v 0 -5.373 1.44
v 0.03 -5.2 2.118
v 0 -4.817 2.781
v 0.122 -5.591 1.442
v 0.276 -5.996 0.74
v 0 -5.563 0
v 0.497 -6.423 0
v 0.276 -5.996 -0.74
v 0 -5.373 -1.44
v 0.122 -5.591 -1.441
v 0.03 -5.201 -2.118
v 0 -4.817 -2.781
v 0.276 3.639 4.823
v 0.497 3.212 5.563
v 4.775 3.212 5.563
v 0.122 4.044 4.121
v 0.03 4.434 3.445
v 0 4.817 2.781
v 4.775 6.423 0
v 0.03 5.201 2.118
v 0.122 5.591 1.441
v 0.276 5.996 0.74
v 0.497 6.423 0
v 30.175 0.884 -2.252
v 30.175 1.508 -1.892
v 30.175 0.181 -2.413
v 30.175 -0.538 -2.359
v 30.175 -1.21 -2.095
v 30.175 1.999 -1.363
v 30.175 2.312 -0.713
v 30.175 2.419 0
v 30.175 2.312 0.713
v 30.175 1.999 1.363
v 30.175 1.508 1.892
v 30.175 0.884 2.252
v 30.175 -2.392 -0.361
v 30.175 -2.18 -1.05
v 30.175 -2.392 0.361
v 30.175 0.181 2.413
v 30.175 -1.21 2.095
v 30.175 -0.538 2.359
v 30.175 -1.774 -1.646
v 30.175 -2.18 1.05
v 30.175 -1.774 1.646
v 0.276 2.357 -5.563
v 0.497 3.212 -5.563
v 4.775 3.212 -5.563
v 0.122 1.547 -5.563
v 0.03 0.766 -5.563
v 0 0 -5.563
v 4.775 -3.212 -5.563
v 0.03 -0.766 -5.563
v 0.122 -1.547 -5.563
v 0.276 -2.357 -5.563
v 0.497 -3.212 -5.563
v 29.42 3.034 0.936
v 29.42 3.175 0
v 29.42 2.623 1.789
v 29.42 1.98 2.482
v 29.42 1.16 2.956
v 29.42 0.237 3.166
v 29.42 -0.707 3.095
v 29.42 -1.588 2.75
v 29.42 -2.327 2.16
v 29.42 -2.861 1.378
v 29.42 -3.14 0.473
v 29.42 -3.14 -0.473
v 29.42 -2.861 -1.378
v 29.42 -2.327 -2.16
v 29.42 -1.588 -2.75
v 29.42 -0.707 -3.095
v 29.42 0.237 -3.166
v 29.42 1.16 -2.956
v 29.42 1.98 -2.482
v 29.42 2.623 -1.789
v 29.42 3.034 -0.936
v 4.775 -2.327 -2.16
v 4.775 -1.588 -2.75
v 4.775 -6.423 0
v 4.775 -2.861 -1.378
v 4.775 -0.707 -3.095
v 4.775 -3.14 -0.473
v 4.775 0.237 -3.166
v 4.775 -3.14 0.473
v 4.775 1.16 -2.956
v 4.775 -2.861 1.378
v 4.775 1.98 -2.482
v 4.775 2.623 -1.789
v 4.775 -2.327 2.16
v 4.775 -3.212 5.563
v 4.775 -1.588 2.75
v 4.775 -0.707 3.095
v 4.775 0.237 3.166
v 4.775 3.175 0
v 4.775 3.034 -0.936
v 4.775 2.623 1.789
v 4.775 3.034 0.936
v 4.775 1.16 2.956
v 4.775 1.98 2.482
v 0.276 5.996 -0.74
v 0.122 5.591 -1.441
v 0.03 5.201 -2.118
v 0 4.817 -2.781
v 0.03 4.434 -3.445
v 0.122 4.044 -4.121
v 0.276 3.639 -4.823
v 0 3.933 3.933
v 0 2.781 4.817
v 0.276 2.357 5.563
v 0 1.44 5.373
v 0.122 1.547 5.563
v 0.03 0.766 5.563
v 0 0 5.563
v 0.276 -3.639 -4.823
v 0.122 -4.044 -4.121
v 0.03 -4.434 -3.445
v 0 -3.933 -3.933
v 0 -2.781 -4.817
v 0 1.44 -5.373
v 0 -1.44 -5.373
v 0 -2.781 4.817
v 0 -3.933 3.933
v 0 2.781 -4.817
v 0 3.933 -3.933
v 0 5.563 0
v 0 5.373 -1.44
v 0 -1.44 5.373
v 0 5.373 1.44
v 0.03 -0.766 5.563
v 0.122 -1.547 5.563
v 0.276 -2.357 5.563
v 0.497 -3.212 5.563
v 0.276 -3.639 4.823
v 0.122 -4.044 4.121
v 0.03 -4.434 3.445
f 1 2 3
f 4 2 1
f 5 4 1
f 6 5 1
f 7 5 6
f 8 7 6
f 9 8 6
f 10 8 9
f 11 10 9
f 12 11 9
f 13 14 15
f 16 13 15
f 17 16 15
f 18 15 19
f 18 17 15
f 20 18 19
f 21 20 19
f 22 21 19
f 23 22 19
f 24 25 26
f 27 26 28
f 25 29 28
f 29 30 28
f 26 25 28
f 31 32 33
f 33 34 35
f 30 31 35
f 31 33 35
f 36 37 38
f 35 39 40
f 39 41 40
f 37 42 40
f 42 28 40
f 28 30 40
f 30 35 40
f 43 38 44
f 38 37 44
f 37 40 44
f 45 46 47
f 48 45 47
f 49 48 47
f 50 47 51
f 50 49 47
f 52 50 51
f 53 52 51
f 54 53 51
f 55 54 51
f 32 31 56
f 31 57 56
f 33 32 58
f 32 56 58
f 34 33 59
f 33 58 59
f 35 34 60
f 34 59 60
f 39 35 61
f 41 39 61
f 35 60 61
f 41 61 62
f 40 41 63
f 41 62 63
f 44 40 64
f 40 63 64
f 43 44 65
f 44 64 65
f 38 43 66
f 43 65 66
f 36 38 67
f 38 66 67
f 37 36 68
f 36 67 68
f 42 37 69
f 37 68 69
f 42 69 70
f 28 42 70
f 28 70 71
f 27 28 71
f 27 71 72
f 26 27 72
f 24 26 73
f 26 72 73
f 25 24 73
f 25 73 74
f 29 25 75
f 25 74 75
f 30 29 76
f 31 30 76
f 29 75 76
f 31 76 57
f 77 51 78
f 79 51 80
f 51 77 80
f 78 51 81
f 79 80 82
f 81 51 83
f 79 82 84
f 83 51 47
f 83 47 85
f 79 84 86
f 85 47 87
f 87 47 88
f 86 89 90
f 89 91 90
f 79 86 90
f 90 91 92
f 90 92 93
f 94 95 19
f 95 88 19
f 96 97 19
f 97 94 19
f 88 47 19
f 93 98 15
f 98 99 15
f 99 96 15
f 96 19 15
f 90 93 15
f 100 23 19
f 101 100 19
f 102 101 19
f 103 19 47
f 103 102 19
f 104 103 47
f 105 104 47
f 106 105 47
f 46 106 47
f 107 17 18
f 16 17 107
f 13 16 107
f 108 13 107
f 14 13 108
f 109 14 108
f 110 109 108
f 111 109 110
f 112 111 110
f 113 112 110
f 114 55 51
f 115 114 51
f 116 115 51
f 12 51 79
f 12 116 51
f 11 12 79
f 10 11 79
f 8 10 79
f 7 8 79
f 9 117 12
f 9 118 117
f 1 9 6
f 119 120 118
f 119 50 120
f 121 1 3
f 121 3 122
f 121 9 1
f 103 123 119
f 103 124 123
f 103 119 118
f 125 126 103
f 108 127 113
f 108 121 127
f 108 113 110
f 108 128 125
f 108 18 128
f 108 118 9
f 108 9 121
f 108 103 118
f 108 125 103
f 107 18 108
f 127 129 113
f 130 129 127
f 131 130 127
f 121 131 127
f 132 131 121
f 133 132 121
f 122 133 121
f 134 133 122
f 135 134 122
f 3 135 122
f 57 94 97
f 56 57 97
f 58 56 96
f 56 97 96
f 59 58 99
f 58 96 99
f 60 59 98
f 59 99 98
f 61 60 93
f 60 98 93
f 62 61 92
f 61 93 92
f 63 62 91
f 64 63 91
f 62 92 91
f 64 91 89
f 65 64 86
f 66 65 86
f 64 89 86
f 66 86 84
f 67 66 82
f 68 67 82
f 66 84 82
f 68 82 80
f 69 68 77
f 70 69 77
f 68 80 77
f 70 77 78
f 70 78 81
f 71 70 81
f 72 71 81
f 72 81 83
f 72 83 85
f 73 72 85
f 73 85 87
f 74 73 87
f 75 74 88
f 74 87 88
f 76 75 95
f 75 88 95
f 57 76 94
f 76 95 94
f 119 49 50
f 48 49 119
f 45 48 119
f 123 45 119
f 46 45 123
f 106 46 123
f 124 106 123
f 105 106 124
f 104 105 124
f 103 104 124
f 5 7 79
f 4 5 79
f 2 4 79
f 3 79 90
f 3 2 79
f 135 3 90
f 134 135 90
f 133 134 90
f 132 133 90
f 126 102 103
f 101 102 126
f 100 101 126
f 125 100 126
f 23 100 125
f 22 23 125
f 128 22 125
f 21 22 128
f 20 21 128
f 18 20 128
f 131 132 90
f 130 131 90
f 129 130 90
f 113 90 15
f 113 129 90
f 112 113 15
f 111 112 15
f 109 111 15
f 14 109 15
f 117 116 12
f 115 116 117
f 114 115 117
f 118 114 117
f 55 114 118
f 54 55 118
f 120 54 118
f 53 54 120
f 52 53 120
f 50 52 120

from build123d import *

# Parameters (mm, degrees)
BASEHEAD_DEPTH = 4.7752


with BuildPart() as part:
    # Sketch1 → BaseHead (new body)
    with BuildSketch(Plane(origin=(0, 0, 0), x_dir=(0, 0, -1), z_dir=(1, 0, 0))):
        Polygon((5.5626, 3.211568607), (5.5626, -3.211568607), (0, -6.423137215), (-5.5626, -3.211568607), (-5.5626, 3.211568607), (0, 6.423137215), align=None)
    extrude(amount=BASEHEAD_DEPTH)

    # BodySke → BaseBody (revolve)
    with BuildSketch(Plane.XY):
        Polygon((0, 0), (30.1752, 0), (30.1752, 2.41935), (29.41955, 3.175), (0, 3.175), align=None)
    revolve(axis=Axis((0, 0, 0), (1, 0, 0)))

    # Sketch3 → HeadChamfer (revolve, cut)
    with BuildSketch(Plane.XY):
        Polygon((0, 5.5626), (4.163005602, 12.773137215), (4.163005602, 19.123137215), (-12.7, 19.123137215), (-12.7, 5.5626), align=None)
    revolve(axis=Axis((0, 0, 0), (1, 0, 0)), mode=Mode.SUBTRACT)


solid = part.part
